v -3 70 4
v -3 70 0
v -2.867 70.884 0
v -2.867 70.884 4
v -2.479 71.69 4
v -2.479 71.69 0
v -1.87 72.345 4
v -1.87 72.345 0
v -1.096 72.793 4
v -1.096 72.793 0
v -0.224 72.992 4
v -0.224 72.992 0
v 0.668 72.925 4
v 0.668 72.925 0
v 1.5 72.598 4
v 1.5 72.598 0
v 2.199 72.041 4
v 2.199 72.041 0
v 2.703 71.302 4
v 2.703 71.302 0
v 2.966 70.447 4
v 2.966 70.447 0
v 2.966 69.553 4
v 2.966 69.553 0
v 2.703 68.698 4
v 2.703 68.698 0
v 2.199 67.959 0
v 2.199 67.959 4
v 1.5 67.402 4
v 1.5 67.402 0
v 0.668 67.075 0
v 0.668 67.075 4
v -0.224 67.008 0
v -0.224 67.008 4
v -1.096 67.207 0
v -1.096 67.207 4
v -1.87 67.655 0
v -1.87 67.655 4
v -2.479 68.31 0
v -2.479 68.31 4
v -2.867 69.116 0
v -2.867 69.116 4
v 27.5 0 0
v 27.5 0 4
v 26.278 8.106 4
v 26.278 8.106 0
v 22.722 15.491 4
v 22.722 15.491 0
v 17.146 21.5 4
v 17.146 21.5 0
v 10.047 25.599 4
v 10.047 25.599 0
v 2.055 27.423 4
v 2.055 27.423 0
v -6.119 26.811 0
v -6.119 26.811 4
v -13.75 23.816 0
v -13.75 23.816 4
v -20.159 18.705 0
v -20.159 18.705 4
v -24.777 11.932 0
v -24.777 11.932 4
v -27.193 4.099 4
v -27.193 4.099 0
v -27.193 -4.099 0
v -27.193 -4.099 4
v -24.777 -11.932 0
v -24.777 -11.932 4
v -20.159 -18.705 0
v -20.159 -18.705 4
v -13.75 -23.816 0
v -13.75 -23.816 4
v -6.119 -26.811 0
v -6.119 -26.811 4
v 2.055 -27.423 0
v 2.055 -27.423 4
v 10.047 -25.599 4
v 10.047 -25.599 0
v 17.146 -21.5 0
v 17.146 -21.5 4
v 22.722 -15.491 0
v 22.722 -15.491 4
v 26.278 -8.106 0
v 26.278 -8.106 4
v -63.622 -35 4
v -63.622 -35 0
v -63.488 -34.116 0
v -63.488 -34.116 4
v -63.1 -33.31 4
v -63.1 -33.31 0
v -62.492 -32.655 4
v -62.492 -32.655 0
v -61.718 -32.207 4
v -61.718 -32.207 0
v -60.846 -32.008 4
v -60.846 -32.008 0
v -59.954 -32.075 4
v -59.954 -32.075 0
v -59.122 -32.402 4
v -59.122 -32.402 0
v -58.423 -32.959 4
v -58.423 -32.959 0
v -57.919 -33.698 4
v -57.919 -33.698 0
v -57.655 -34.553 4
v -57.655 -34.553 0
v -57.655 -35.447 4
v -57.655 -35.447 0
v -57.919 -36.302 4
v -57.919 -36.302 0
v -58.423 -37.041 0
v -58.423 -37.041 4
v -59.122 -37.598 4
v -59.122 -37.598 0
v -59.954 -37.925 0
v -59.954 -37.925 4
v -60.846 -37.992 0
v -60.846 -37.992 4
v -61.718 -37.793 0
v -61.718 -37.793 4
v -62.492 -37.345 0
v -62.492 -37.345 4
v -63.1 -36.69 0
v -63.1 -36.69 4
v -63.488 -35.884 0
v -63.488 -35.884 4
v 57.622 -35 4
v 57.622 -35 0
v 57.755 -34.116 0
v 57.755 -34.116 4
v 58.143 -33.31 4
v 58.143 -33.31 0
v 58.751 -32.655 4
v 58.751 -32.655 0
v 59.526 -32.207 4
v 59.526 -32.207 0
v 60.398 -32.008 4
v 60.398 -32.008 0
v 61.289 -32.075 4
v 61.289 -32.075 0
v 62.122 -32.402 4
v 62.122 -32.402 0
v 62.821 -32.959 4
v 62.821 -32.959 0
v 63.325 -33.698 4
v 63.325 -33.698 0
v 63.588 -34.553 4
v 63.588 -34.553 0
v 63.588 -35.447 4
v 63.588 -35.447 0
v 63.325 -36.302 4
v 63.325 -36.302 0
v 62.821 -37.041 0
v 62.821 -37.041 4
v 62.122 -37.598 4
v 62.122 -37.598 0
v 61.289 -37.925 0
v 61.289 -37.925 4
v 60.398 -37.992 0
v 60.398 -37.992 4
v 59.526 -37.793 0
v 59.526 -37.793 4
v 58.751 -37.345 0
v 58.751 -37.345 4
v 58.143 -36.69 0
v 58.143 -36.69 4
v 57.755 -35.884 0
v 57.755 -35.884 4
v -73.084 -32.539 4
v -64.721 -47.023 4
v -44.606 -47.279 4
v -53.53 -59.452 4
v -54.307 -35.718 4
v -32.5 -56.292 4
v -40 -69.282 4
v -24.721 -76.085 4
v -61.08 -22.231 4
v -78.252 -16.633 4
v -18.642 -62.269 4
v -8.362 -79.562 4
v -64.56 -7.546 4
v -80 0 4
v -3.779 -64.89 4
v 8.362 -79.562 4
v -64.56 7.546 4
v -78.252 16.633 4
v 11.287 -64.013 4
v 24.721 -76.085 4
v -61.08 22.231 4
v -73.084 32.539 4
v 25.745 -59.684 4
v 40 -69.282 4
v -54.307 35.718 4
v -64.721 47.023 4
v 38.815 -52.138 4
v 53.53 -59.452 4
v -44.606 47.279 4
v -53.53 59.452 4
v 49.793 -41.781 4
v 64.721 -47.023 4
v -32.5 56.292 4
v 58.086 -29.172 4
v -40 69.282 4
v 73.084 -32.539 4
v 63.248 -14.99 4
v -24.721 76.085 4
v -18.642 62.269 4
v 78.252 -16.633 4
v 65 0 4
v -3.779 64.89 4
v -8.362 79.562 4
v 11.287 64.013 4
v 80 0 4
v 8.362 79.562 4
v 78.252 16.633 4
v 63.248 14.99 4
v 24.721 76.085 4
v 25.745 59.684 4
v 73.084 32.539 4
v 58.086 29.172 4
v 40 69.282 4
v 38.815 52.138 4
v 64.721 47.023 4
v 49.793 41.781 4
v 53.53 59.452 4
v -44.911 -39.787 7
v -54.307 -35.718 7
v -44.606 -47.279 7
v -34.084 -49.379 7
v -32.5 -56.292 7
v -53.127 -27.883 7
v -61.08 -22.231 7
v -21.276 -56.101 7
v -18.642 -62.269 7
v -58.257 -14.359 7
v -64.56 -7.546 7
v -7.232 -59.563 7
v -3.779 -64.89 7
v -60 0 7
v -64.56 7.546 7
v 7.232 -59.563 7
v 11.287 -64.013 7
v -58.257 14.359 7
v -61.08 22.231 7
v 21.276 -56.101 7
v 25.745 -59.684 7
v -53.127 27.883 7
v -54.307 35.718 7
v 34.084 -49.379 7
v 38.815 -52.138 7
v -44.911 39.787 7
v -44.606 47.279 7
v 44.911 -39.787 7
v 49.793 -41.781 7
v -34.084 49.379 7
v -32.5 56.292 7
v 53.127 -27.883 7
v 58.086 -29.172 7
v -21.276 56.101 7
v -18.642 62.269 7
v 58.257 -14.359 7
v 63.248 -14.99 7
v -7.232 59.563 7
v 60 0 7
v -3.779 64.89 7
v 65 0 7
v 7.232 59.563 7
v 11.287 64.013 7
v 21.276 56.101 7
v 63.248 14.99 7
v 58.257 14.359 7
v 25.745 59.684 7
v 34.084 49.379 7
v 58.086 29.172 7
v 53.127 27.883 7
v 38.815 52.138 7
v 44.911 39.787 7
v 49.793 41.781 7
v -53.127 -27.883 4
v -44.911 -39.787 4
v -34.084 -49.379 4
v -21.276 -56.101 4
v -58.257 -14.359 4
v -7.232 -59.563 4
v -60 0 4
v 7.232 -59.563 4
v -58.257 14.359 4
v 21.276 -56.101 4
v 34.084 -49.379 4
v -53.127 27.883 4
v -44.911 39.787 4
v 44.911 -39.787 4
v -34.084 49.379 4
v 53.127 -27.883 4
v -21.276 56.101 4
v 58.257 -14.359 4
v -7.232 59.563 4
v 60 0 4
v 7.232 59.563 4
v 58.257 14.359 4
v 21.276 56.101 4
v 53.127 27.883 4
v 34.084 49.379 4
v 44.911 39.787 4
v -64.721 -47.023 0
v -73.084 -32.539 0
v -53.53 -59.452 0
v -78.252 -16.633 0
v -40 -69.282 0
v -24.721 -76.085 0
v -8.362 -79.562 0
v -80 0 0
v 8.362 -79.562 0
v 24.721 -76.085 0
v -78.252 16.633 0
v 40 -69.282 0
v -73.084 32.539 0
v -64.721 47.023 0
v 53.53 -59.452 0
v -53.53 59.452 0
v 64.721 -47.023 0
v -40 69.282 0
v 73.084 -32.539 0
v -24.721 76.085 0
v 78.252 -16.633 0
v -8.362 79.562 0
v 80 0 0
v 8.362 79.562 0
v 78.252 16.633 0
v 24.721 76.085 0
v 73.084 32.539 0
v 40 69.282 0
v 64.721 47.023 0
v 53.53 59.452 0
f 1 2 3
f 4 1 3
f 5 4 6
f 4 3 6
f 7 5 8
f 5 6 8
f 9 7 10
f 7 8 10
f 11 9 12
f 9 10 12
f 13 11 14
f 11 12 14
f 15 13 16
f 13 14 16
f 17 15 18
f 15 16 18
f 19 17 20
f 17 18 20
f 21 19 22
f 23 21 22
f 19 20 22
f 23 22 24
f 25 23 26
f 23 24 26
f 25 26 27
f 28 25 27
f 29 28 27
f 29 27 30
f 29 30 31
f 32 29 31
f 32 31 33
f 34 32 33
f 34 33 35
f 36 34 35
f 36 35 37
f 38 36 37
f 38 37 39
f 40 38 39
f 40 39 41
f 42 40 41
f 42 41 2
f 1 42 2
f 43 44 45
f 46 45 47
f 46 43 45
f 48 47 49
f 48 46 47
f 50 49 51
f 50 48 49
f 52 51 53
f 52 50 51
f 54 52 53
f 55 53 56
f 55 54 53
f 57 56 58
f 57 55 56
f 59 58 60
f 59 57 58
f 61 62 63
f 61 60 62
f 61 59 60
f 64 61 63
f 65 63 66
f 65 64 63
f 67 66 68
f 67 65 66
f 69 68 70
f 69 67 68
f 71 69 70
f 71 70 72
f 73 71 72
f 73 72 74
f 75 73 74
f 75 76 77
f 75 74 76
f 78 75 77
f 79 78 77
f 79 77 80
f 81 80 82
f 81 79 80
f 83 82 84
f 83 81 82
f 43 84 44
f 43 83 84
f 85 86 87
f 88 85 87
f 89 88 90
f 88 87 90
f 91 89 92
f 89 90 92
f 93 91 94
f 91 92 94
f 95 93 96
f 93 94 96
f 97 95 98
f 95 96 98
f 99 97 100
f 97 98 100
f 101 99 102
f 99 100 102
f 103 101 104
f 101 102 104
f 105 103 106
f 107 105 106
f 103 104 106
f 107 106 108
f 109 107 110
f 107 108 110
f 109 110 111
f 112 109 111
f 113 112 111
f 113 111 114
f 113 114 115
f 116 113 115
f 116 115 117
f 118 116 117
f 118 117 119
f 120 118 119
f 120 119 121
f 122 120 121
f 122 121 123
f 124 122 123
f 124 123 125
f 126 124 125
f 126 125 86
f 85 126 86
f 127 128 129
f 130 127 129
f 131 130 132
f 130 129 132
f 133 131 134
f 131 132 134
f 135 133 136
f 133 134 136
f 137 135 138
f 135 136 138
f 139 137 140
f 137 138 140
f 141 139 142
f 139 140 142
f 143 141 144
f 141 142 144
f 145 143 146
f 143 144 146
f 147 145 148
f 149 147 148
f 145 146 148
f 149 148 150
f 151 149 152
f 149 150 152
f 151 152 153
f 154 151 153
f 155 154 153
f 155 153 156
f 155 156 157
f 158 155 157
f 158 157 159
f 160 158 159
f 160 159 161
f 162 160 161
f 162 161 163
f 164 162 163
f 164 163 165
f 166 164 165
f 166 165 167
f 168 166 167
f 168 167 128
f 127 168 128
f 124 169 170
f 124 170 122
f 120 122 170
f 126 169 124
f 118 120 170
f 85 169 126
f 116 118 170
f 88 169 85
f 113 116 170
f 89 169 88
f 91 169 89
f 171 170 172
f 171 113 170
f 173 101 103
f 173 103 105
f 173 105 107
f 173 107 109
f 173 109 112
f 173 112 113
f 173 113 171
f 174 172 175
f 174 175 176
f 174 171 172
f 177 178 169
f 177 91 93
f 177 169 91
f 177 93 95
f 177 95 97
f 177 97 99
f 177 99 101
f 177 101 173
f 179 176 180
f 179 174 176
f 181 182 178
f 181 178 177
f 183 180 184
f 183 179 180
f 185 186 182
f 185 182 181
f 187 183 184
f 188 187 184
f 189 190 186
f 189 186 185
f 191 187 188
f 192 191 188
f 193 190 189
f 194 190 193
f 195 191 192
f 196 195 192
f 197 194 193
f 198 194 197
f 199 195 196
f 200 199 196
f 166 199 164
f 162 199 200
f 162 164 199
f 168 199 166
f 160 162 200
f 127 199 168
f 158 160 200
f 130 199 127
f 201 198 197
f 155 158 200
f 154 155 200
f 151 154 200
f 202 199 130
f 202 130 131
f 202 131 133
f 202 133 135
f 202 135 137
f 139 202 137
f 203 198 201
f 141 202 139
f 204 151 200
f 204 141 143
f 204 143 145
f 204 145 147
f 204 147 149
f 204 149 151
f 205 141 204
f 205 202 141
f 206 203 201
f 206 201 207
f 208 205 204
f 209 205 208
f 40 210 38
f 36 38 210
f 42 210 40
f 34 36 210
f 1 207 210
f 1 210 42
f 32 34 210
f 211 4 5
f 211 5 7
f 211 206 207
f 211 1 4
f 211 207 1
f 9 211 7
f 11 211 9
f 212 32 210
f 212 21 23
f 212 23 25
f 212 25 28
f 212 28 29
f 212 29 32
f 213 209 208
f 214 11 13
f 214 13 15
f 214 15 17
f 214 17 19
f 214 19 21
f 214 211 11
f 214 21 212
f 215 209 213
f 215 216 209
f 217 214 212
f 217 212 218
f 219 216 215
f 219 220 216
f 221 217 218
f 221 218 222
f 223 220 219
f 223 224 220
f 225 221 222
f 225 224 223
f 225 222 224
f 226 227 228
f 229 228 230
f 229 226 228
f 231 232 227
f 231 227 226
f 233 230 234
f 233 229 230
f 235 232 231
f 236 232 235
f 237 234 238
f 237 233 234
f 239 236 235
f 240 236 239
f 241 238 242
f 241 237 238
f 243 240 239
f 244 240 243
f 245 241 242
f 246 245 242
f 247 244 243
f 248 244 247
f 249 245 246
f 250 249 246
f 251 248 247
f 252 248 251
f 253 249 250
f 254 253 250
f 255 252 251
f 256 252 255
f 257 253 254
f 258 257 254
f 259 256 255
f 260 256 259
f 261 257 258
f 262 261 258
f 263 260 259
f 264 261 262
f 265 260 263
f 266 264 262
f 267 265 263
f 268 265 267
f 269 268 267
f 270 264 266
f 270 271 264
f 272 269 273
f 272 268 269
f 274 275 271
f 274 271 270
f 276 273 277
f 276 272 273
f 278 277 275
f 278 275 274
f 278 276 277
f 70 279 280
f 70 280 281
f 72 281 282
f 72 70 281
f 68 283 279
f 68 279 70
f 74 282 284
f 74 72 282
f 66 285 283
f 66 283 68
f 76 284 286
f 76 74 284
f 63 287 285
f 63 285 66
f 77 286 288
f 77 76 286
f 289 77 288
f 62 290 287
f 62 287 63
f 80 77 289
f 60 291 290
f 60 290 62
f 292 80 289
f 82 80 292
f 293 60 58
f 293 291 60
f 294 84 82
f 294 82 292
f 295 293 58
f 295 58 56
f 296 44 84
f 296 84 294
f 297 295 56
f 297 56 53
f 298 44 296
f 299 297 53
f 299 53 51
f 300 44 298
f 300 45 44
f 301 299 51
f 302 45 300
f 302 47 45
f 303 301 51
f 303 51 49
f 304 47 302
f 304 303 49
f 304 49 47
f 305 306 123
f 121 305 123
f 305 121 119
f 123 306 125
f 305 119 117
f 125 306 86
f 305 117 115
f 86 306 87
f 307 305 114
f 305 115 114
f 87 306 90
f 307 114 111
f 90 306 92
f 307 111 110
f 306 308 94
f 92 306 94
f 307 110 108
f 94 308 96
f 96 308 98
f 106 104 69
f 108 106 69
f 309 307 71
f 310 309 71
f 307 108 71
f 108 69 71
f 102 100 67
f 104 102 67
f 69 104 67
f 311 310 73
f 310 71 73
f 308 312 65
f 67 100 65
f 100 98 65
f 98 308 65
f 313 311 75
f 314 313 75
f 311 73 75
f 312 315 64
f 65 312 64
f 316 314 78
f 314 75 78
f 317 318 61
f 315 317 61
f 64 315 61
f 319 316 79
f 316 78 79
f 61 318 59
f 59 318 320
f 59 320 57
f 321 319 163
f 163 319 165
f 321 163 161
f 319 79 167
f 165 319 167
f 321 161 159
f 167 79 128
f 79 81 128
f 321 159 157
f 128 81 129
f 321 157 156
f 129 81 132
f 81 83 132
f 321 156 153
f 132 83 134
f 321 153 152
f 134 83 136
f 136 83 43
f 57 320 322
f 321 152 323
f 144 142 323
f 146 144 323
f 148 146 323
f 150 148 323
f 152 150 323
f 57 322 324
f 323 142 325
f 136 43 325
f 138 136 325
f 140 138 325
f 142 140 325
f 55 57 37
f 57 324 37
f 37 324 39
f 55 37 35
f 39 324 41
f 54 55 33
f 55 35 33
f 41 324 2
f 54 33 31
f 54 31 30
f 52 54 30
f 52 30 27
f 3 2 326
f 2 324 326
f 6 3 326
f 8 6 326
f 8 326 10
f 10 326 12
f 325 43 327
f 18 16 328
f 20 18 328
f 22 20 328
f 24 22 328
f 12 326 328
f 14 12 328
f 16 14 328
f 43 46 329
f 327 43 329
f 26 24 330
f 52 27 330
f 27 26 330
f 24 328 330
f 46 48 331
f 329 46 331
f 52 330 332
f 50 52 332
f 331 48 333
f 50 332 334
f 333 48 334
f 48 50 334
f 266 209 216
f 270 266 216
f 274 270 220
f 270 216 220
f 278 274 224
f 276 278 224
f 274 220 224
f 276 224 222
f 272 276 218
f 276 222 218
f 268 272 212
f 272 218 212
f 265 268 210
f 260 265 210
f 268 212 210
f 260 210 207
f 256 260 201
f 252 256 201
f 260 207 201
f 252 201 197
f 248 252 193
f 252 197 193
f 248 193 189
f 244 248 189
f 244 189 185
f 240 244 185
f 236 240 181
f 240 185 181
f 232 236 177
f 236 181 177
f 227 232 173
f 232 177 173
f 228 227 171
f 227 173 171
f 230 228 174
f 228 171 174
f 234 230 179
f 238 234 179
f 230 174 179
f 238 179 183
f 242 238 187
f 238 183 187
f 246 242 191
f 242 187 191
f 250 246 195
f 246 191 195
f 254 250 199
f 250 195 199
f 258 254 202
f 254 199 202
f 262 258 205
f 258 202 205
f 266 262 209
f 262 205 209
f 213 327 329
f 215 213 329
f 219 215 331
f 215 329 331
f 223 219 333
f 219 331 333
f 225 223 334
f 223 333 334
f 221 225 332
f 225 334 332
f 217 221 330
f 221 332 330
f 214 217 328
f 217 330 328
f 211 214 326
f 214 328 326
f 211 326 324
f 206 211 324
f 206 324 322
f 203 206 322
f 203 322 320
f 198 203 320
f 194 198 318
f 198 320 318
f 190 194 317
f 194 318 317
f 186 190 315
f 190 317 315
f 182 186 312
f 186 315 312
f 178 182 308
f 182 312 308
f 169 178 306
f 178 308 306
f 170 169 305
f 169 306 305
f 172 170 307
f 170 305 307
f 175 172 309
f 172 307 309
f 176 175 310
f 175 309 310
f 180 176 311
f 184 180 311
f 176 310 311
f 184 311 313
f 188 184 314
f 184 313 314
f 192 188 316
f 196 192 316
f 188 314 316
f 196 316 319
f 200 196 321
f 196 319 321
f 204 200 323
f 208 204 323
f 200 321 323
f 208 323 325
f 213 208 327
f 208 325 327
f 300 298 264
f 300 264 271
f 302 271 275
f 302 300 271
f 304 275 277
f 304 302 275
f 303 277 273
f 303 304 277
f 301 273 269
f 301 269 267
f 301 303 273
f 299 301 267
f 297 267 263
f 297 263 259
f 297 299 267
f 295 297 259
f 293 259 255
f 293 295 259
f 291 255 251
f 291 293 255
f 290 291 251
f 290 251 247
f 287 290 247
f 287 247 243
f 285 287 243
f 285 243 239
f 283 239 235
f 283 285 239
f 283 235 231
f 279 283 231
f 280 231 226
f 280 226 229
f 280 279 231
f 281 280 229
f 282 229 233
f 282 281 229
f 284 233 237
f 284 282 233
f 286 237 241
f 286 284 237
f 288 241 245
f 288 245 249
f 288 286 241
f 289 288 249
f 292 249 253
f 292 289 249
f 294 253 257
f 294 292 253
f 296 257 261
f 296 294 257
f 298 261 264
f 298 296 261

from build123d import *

# Parameters (mm, degrees)
SKETCH1_R           = 80
BOSS_EXTRUDE1_DEPTH = 4
SKETCH2_R           = 65
SKETCH2_R_2         = 60
BOSS_EXTRUDE2_DEPTH = 3
SKETCH3_R           = 3
CUT_EXTRUDE2_DEPTH  = 8
SKETCH5_R           = 27.5
CUT_EXTRUDE4_DEPTH  = 8


with BuildPart() as part:
    # Sketch1 → Boss-Extrude1 (new body)
    with BuildSketch(Plane.XY):
        Circle(SKETCH1_R)
    extrude(amount=BOSS_EXTRUDE1_DEPTH)

    # Sketch2 → Boss-Extrude2 (add)
    with BuildSketch(Plane.XY.offset(4)):
        Circle(SKETCH2_R)
        Circle(SKETCH2_R_2, mode=Mode.SUBTRACT)
    extrude(amount=BOSS_EXTRUDE2_DEPTH)

    # Sketch3 → Cut-Extrude2 (cut, through all)
    with BuildSketch(Plane(origin=(0, 0, 0), x_dir=(-1, 0, 0), z_dir=(0, 0, -1))):
        with Locations((0, 70)):
            Circle(SKETCH3_R)
        with Locations((60.621778265, -35)):
            Circle(SKETCH3_R)
        with Locations((-60.621778265, -35)):
            Circle(SKETCH3_R)
    extrude(amount=-CUT_EXTRUDE2_DEPTH, mode=Mode.SUBTRACT)

    # Sketch5 → Cut-Extrude4 (cut, through all)
    with BuildSketch(Plane.XY):
        Circle(SKETCH5_R)
    extrude(amount=CUT_EXTRUDE4_DEPTH, mode=Mode.SUBTRACT)


solid = part.part
